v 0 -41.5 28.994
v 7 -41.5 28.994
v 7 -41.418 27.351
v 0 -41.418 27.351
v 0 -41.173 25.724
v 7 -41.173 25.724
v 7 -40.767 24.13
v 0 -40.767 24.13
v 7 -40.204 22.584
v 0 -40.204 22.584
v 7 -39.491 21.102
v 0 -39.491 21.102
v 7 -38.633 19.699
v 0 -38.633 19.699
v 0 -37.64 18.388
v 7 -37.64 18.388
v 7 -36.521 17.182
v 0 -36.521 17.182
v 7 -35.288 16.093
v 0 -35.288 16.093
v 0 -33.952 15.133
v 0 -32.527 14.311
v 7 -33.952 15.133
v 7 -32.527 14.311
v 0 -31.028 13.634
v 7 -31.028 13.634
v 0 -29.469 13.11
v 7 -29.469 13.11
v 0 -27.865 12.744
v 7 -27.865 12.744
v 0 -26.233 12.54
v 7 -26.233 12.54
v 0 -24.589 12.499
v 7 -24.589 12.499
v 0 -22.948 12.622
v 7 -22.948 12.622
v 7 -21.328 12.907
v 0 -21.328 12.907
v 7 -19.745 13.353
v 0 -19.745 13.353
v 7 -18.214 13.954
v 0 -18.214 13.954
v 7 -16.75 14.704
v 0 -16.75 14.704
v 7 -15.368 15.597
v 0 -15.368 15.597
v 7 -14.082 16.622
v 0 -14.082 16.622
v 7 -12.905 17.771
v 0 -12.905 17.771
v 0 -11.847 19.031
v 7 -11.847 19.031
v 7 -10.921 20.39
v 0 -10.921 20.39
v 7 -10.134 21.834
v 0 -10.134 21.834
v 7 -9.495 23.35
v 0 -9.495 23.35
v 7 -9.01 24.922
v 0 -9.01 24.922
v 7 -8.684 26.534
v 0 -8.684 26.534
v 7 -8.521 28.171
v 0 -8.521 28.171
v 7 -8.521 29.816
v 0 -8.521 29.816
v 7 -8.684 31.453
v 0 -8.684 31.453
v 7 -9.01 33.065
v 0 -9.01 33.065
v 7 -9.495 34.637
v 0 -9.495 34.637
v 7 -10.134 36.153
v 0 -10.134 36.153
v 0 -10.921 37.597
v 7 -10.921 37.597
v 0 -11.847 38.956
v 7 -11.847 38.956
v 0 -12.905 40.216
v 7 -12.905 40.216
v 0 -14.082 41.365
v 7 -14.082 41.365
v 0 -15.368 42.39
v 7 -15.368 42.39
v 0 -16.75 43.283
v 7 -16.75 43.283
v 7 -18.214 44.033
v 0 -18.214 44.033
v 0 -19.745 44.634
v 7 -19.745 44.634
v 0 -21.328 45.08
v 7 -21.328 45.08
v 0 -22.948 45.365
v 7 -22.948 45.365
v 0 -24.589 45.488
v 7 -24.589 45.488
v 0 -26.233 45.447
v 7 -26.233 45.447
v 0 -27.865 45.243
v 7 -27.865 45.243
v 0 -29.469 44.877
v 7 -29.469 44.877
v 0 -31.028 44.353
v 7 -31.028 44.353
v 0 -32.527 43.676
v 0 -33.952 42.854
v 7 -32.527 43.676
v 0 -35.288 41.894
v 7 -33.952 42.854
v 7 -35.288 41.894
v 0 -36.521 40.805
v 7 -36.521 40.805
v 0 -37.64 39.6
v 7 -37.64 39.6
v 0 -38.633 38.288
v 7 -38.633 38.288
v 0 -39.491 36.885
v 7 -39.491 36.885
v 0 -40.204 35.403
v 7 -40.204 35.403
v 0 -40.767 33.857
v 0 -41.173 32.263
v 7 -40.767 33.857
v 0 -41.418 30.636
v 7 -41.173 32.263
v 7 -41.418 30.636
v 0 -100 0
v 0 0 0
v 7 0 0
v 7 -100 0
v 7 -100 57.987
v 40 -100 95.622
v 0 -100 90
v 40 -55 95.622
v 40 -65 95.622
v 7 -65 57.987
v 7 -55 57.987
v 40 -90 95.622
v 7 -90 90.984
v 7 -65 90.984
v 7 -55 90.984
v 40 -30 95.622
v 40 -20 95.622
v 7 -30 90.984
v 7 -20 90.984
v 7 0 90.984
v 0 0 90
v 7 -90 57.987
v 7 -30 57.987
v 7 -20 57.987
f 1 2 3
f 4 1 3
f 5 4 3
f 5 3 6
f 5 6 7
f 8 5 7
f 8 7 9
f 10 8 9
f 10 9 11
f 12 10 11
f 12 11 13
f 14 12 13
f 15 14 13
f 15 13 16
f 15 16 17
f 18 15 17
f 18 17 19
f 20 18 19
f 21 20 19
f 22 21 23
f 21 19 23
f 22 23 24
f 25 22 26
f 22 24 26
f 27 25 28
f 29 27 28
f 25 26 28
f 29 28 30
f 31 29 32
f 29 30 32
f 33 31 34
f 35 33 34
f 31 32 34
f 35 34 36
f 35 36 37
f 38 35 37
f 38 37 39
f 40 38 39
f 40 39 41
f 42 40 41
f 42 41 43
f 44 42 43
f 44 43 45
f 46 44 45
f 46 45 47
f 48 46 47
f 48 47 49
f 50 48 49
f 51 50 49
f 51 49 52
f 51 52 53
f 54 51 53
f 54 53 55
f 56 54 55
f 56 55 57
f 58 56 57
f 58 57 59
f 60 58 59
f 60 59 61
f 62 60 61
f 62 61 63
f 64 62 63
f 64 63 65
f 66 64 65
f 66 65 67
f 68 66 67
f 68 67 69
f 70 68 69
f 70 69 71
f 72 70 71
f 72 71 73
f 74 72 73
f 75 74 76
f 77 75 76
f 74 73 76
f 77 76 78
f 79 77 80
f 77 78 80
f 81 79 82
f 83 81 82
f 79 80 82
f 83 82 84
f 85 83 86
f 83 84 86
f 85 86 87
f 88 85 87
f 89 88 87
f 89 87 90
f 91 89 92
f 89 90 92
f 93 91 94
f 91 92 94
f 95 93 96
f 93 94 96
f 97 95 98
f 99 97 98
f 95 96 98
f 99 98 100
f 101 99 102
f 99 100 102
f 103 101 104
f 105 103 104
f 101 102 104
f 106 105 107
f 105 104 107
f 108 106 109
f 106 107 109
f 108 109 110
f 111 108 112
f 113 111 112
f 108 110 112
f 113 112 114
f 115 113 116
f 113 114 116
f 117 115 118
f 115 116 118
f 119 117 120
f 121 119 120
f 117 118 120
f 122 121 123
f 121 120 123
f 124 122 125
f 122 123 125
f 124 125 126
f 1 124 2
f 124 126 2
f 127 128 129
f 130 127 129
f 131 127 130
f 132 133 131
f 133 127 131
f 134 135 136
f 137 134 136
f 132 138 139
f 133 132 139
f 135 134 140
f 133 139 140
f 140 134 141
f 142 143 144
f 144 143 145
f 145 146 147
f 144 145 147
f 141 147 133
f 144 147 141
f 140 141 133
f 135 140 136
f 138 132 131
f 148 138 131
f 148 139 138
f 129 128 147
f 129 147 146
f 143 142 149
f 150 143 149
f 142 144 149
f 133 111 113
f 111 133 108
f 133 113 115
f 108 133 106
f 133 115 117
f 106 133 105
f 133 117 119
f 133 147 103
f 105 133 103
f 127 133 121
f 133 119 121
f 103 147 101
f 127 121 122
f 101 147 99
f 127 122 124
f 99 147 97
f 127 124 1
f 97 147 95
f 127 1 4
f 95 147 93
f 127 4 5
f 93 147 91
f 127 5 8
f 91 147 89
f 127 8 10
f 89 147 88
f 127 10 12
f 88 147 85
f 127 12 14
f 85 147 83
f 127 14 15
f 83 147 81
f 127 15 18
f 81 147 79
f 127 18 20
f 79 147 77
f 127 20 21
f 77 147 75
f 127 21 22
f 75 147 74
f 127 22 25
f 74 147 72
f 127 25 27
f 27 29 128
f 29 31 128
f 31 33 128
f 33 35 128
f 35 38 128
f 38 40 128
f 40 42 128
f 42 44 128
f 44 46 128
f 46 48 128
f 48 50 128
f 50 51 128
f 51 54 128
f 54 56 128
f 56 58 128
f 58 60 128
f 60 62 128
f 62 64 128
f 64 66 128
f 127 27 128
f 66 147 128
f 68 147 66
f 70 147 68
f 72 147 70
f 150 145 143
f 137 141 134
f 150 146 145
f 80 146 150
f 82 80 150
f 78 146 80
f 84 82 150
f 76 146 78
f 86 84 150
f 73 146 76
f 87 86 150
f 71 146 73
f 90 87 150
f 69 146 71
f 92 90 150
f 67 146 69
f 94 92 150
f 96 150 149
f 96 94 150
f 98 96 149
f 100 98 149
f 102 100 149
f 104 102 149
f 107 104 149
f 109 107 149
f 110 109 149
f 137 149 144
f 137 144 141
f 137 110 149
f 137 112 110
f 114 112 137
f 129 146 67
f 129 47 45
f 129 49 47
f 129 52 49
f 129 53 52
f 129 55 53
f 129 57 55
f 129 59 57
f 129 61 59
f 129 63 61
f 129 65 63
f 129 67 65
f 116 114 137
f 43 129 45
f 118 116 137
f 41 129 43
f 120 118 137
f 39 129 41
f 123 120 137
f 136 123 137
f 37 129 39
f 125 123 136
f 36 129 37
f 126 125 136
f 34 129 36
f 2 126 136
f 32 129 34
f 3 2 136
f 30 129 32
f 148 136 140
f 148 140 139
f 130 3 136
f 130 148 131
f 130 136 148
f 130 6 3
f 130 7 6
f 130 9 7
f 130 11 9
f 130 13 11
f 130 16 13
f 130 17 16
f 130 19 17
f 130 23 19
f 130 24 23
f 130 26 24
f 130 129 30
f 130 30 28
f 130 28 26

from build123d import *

# Parameters (mm, degrees)
F1_DEPTH = 100
F3_DEPTH = 100
F4_W     = 37.074
F4_H     = 23.256904
F4_H_2   = 25
F5_DEPTH = 150
F7_DEPTH = 25


with BuildPart() as f1:
    # F0 (on Front) → F1 (new body)
    with BuildSketch(Plane.XZ):
        Polygon((0, 90), (0, 0), (148.54021, 0), (148.54021, 110.875965), align=None)
    extrude(amount=F1_DEPTH)

    # F2 (on face) → F3 (cut)
    with BuildSketch(Plane.XZ.offset(100)):
        Polygon((7, 0), (40, 0), (148.54021, 0), (148.54021, 169.224784), (40, 169.224784), (40, 95.621633), (7, 57.987016), align=None)
    extrude(amount=-F3_DEPTH, mode=Mode.SUBTRACT)

    # F4 (on face) → F5 (cut)
    with BuildSketch(Plane(origin=(0, 0, 0), x_dir=(1, 0, 0), z_dir=(0, 0, -1))):
        with Locations((25.537, 8.371548)):
            Rectangle(F4_W, F4_H)
        with Locations((25.537, 42.5)):
            Rectangle(F4_W, F4_H_2)
        with Locations((25.537, 77.5)):
            Rectangle(F4_W, F4_H_2)
    extrude(amount=-F5_DEPTH, mode=Mode.SUBTRACT)

    # F6 (on face) → F7 (cut)
    with BuildSketch(Plane.YZ.offset(7)):
        with BuildLine():
            ThreePointArc((-8.5, 28.993508), (-25, 45.493508), (-41.5, 28.993508))
            Line((-41.5, 28.993508), (-8.5, 28.993508))
        make_face()
        with BuildLine():
            Line((-8.5, 28.993508), (-41.5, 28.993508))
            ThreePointArc((-41.5, 28.993508), (-25, 12.493508), (-8.5, 28.993508))
        make_face()
    extrude(amount=-F7_DEPTH, mode=Mode.SUBTRACT)


solid = f1.part
